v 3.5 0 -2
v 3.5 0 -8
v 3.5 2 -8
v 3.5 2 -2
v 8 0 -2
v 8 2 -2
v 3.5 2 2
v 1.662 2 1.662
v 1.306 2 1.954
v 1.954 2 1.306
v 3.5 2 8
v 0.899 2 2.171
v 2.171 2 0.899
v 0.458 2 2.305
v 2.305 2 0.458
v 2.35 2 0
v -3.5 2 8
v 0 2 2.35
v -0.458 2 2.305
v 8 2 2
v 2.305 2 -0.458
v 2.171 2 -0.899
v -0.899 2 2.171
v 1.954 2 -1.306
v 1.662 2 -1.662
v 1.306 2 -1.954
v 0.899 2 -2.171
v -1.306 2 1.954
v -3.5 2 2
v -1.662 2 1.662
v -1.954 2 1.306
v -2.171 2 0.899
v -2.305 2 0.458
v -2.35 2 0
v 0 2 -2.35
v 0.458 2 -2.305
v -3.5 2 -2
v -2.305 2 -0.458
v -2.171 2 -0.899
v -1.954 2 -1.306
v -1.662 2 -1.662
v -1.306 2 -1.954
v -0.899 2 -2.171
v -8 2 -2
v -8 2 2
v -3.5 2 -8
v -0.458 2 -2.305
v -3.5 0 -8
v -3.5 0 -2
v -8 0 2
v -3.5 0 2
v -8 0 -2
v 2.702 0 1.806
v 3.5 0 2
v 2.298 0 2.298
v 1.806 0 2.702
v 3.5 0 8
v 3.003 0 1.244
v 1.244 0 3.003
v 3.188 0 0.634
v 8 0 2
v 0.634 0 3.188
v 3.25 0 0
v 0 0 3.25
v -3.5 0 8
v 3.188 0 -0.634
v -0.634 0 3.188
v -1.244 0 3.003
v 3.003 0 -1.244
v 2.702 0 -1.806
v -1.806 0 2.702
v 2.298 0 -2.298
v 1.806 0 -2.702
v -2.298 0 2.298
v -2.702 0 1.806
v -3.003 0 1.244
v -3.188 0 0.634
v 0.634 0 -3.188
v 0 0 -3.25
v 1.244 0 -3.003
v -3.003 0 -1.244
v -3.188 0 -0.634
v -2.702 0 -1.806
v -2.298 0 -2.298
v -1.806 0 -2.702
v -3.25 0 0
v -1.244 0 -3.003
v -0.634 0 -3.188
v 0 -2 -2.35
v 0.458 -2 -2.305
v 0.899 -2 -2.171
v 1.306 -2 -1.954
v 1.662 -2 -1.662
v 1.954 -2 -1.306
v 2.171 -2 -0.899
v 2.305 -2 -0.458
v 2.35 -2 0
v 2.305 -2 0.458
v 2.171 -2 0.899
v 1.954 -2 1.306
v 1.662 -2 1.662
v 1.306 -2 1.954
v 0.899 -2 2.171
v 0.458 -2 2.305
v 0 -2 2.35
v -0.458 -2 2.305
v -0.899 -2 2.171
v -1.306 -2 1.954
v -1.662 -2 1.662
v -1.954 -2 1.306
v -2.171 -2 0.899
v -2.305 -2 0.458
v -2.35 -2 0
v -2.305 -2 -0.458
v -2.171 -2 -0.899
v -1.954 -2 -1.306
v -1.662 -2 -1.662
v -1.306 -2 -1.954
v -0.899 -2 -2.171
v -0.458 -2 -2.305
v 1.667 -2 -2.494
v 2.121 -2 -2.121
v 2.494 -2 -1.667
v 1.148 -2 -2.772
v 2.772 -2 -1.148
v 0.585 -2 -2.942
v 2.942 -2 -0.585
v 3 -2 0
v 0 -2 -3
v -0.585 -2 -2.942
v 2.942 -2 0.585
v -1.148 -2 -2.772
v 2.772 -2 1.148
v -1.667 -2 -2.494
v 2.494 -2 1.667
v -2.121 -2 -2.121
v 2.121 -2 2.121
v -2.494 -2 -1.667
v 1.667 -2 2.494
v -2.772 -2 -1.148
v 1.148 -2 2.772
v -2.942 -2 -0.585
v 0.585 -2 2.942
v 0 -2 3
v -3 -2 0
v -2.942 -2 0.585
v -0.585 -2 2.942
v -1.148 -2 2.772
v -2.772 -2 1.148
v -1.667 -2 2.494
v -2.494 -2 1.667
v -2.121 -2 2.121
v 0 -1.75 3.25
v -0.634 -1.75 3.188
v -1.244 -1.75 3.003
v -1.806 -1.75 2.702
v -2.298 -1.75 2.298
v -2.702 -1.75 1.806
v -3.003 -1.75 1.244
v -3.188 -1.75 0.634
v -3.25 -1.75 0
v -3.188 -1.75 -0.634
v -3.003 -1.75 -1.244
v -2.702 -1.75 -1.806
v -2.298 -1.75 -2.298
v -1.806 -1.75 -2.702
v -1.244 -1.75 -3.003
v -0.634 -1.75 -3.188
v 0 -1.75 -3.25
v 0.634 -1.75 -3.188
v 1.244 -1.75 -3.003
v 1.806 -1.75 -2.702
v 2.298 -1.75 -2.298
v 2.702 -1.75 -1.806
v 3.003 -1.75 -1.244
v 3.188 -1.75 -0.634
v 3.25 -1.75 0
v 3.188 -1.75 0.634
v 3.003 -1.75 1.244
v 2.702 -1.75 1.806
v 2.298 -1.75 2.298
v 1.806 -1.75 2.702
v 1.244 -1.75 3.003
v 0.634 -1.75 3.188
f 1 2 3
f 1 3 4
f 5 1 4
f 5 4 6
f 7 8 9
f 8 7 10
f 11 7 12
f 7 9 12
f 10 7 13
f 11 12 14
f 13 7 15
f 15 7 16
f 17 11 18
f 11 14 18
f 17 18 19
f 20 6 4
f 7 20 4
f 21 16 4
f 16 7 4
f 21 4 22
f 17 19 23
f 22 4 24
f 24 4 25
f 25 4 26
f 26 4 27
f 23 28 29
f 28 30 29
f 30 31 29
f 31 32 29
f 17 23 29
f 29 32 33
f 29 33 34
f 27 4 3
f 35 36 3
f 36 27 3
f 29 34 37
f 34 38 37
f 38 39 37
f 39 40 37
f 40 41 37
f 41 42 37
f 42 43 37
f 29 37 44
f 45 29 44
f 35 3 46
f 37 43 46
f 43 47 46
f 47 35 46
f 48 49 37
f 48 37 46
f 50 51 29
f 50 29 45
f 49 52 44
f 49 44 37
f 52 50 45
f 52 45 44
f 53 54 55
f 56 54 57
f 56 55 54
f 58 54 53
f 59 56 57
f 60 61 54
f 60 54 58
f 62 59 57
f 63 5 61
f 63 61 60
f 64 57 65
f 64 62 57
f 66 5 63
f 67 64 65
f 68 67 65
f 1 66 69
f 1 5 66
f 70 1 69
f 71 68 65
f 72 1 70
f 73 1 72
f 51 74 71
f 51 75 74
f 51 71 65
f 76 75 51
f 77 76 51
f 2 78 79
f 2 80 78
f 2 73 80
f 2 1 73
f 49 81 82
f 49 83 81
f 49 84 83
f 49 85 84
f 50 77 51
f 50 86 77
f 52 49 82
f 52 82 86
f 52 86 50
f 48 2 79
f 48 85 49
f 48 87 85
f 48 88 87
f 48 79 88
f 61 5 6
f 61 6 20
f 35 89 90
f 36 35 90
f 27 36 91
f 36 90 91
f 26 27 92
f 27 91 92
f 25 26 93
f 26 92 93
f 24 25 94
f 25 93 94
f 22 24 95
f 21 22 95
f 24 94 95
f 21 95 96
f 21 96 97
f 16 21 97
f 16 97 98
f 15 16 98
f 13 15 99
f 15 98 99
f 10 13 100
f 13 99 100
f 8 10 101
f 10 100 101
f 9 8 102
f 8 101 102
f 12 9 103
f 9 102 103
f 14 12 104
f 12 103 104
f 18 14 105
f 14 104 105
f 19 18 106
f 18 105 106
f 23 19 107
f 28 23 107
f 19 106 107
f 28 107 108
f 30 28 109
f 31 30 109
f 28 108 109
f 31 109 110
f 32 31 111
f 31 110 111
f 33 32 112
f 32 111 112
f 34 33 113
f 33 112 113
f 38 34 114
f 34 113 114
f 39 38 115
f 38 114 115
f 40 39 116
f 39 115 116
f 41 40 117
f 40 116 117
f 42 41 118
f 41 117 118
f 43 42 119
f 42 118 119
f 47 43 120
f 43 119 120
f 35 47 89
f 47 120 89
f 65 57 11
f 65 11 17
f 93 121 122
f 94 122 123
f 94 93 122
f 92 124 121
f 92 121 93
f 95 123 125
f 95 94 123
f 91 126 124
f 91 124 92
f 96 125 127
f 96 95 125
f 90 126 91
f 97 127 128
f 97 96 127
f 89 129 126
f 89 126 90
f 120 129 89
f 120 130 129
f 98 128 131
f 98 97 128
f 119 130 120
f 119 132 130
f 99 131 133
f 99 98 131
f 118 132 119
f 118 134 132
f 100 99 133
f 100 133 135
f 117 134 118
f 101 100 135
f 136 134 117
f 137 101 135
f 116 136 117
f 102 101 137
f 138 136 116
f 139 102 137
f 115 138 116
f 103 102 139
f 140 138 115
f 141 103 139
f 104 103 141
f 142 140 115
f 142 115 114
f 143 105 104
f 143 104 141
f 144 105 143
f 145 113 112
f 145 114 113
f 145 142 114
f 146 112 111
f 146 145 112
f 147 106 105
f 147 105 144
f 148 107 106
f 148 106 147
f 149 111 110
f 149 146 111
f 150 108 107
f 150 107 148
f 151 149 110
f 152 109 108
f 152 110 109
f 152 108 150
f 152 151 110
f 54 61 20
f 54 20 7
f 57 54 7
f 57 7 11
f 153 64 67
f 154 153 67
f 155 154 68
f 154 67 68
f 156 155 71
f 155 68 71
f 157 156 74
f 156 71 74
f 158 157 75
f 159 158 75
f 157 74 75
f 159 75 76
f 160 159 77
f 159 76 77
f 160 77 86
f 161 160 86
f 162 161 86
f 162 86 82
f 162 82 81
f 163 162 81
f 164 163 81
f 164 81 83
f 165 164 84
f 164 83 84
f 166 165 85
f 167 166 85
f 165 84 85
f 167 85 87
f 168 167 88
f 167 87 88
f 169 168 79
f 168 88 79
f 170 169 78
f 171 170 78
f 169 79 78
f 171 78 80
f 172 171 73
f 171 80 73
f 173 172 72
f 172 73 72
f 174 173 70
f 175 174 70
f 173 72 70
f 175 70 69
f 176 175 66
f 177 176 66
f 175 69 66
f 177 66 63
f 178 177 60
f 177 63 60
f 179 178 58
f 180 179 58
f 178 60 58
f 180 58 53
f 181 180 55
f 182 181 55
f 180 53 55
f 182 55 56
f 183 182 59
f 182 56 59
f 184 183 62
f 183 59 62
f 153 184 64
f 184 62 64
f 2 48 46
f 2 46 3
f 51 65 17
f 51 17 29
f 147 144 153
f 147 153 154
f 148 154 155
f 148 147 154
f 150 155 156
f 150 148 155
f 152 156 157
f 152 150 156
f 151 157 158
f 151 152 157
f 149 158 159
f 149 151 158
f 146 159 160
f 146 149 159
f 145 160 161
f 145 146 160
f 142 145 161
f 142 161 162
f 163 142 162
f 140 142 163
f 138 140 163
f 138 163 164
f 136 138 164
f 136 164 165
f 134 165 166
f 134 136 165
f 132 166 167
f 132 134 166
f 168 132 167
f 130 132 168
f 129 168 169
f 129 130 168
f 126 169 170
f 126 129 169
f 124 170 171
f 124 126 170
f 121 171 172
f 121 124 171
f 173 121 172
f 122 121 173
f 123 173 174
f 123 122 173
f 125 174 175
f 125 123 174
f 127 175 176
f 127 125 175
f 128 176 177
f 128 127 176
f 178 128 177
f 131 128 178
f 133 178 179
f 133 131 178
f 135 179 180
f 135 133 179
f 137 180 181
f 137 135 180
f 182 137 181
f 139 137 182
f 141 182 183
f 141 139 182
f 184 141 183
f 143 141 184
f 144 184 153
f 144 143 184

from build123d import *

# Parameters (mm, degrees)
GRUNDPLATTE_KREUZ_DEPTH         = 2
MITTELBOHRUNG_DEPTH             = 12.489125293
MITTELBOHRUNG_DEPTH_BACK        = 12.489125293
SKIZZE11_R                      = 1.25
SKIZZE12_R                      = 3.25
AUFSATZ_LINEAR_AUSTRAGEN2_DEPTH = 2
FASE1_SIZE                      = 0.25
SKIZZE13_R                      = 2.35
SCHNITT_LINEAR_AUSTRAGEN1_DEPTH = 4


with BuildPart() as part:
    # Skizze4 → Grundplatte Kreuz (new body)
    with BuildSketch(Plane(origin=(0, 0, 0), x_dir=(1, 0, 0), z_dir=(0, 1, 0))):
        Polygon((-8, -2), (-8, 2), (-3.5, 2), (-3.5, 8), (3.5, 8), (3.5, 2), (8, 2), (8, -2), (3.5, -2), (3.5, -8), (-3.5, -8), (-3.5, -2), align=None)
    extrude(amount=GRUNDPLATTE_KREUZ_DEPTH)

    # Skizze11 → Mittelbohrung (cut, two sides: drawn at the far end of the back side and taken through both)
    with BuildSketch(Plane(origin=(0, 0, 0), x_dir=(1, 0, 0), z_dir=(0, 1, 0)).offset(-MITTELBOHRUNG_DEPTH_BACK)):
        with Locations(Location((0, 0, 0), (0, 0, 270))):
            Circle(SKIZZE11_R)
    extrude(amount=MITTELBOHRUNG_DEPTH + MITTELBOHRUNG_DEPTH_BACK, mode=Mode.SUBTRACT)

    # Skizze12 → Aufsatz-Linear austragen2 (add)
    with BuildSketch(Plane.XZ):
        with Locations(Location((0, 0, 0), (0, 0, 90))):
            Circle(SKIZZE12_R)
    extrude(amount=AUFSATZ_LINEAR_AUSTRAGEN2_DEPTH)

    # Fase1
    fase1_edges = [part.edges().sort_by_distance(p)[0] for p in [
        (0, -2, -3.25),
    ]]
    chamfer(fase1_edges, length=FASE1_SIZE)

    # Skizze13 → Schnitt-Linear austragen1 (cut)
    with BuildSketch(Plane.XZ.offset(2)):
        with Locations(Location((0, 0, 0), (0, 0, 270))):
            Circle(SKIZZE13_R)
    extrude(amount=-SCHNITT_LINEAR_AUSTRAGEN1_DEPTH, mode=Mode.SUBTRACT)


solid = part.part
